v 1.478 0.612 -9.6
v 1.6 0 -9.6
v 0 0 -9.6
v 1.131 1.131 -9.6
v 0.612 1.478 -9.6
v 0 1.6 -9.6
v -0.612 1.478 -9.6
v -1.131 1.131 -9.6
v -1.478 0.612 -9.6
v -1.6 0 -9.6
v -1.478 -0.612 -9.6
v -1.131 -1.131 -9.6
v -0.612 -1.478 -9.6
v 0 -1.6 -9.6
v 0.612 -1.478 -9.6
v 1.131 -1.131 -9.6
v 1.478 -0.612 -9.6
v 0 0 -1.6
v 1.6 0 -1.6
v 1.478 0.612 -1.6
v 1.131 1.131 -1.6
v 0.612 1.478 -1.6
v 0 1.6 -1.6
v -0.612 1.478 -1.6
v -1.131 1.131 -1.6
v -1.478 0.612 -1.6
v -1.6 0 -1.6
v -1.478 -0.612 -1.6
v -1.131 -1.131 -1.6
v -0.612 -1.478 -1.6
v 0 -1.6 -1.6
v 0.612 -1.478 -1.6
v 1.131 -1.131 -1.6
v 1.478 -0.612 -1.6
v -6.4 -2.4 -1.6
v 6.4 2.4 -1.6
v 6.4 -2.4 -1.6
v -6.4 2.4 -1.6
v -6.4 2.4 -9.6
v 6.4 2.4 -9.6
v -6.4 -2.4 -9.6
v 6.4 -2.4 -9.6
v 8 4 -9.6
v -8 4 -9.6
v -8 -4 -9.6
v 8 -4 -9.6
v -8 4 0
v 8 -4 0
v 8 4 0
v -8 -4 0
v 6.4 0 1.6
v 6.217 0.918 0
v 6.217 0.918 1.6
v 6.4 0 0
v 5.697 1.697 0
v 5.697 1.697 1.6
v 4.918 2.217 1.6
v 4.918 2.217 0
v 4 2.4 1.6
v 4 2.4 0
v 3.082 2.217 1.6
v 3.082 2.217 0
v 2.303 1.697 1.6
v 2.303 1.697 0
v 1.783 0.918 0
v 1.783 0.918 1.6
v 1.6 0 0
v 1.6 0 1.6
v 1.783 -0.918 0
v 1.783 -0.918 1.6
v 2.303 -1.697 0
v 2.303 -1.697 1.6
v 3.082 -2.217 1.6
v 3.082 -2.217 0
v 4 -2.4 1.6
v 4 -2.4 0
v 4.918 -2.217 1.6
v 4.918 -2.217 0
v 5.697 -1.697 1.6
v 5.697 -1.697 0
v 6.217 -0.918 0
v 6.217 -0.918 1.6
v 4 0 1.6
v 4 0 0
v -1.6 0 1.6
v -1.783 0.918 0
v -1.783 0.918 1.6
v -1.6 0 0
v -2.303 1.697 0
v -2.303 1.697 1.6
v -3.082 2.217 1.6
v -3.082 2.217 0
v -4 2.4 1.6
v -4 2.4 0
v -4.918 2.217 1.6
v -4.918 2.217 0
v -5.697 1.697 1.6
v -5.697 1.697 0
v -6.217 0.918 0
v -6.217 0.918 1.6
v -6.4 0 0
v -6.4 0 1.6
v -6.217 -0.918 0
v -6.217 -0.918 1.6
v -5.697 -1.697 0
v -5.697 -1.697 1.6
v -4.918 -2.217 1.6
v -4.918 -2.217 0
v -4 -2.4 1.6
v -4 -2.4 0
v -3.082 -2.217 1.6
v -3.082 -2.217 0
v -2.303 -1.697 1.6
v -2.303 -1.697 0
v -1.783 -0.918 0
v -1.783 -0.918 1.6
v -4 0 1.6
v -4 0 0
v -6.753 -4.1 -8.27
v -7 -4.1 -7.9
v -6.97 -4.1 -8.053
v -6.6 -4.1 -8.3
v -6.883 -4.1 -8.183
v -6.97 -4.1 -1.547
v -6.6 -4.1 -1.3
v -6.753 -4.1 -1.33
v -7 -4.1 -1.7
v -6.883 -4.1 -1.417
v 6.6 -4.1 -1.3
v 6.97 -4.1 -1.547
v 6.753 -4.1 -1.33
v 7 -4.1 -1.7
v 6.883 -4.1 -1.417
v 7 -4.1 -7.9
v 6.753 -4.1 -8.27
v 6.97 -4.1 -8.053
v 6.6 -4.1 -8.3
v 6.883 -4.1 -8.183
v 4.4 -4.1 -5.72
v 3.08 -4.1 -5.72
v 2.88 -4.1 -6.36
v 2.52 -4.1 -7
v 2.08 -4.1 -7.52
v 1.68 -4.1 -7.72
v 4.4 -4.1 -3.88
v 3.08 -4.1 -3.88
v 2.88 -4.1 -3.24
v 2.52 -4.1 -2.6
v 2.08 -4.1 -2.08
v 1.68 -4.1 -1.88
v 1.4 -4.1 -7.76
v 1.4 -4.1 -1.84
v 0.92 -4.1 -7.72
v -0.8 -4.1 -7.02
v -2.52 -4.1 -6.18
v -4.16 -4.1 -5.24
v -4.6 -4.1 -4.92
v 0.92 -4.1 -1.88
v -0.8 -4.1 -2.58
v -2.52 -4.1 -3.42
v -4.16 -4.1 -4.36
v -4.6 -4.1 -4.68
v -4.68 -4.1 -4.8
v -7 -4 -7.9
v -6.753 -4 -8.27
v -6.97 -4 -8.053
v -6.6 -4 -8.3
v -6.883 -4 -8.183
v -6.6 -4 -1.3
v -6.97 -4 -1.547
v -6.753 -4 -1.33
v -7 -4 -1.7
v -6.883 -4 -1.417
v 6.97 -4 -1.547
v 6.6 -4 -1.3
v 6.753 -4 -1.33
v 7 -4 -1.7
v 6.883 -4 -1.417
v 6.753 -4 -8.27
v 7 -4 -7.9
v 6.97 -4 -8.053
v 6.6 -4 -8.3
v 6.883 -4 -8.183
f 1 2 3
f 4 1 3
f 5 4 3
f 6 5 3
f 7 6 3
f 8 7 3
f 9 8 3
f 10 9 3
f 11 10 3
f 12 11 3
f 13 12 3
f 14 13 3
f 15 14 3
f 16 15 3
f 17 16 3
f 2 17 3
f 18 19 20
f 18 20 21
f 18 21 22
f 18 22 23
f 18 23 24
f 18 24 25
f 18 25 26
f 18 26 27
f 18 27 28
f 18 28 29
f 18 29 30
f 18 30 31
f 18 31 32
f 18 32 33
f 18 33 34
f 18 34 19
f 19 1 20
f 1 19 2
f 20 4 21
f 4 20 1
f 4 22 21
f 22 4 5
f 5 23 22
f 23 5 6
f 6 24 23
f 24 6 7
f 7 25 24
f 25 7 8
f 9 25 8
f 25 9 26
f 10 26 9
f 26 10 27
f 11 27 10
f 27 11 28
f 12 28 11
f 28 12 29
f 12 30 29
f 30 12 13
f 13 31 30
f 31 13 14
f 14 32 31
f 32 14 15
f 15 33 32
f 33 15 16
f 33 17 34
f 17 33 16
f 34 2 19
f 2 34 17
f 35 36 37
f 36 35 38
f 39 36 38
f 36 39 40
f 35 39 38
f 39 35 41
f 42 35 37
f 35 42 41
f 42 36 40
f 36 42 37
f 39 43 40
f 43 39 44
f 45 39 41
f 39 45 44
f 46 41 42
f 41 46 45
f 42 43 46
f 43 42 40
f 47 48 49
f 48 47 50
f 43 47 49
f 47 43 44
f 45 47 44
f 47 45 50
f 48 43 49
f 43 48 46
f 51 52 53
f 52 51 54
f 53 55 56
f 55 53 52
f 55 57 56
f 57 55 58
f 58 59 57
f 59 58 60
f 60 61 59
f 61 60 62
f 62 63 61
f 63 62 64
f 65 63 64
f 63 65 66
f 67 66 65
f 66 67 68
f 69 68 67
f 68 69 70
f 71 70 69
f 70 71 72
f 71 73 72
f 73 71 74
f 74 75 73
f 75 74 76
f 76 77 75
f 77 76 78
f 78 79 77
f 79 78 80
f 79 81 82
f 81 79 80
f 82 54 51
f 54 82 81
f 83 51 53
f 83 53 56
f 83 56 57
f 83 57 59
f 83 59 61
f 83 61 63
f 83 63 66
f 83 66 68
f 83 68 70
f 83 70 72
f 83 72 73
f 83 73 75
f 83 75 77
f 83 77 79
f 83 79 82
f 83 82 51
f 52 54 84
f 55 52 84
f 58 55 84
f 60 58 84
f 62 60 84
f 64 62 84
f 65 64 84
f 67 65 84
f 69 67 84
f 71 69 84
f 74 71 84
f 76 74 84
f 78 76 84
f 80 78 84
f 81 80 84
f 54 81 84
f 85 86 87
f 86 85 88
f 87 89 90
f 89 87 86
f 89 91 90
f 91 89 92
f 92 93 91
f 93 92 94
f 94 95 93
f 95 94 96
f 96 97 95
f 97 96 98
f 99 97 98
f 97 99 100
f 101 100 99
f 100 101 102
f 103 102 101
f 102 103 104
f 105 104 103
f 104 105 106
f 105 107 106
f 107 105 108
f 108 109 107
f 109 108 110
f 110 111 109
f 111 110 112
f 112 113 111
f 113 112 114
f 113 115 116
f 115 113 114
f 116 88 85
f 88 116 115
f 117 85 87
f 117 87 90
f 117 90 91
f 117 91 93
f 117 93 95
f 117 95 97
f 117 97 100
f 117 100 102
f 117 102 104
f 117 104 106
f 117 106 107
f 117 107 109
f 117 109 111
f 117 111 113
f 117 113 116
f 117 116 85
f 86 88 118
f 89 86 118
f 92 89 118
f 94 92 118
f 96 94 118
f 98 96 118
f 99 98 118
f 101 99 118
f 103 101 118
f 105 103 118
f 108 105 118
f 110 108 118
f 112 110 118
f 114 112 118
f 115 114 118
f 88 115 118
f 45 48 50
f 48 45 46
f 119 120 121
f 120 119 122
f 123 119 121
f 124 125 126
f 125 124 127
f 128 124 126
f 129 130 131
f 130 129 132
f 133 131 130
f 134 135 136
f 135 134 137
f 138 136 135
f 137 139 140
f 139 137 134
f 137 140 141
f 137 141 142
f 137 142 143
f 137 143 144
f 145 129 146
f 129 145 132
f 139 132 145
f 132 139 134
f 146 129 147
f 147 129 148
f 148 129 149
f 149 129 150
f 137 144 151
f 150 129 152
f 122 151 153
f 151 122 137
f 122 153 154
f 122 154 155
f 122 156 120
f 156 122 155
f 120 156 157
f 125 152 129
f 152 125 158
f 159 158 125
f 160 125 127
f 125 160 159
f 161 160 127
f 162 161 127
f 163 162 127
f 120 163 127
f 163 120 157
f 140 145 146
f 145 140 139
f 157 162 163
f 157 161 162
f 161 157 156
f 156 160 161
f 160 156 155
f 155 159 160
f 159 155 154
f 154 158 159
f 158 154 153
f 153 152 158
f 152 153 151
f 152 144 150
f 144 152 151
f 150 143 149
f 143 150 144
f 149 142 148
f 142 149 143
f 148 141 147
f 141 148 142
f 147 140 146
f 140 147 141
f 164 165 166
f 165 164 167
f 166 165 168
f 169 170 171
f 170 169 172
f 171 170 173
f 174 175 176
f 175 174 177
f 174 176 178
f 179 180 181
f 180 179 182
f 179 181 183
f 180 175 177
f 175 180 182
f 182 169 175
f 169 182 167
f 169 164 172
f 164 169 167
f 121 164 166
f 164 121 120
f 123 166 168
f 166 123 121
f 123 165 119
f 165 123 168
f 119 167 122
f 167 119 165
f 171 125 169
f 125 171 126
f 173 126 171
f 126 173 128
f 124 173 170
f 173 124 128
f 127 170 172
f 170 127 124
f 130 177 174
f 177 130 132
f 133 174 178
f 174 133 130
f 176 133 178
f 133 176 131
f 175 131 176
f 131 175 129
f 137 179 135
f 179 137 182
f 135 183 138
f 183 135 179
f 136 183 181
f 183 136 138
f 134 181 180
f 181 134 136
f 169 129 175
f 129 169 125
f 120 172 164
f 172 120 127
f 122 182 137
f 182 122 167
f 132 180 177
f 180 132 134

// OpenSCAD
// file: ../p/4-4edge.scad
use <../lib.scad>
function ldraw_lib__4_4edge() = [
// 0 Circle 1.0
// 0 Name: 4-4edge.dat
// 0 Author: James Jessiman
// 0 !LDRAW_ORG Primitive UPDATE 2017-01
// 0 !LICENSE Licensed under CC BY 2.0 and CC BY 4.0 : see CAreadme.txt
// 
// 0 BFC CERTIFY CCW
  [0,"BFC","CERTIFY"],
  [0,"BFC","CCW"],
// 
// 0 !HISTORY 1998-12-15 [PTadmin] Official Update 1998-10
// 0 !HISTORY 2005-12-28 [PTadmin] Official Update 2005-01
// 0 !HISTORY 2007-06-24 [PTadmin] Header formatted for Contributor Agreement
// 0 !HISTORY 2008-07-01 [PTadmin] Official Update 2008-01
// 0 !HISTORY 2017-01-15 [Steffen] BFCed
// 0 !HISTORY 2017-12-30 [PTadmin] Official Update 2017-01
// 
// 
// 2 24 1 0 0 0.9239 0 0.3827
  [2,24,1,0,0,0.9239,0,0.3827],
// 2 24 0.9239 0 0.3827 0.7071 0 0.7071
  [2,24,0.9239,0,0.3827,0.7071,0,0.7071],
// 2 24 0.7071 0 0.7071 0.3827 0 0.9239
  [2,24,0.7071,0,0.7071,0.3827,0,0.9239],
// 2 24 0.3827 0 0.9239 0 0 1
  [2,24,0.3827,0,0.9239,0,0,1],
// 2 24 0 0 1 -0.3827 0 0.9239
  [2,24,0,0,1,-0.3827,0,0.9239],
// 2 24 -0.3827 0 0.9239 -0.7071 0 0.7071
  [2,24,-0.3827,0,0.9239,-0.7071,0,0.7071],
// 2 24 -0.7071 0 0.7071 -0.9239 0 0.3827
  [2,24,-0.7071,0,0.7071,-0.9239,0,0.3827],
// 2 24 -0.9239 0 0.3827 -1 0 -0
  [2,24,-0.9239,0,0.3827,-1,0,-0],
// 2 24 -1 0 -0 -0.9239 0 -0.3827
  [2,24,-1,0,-0,-0.9239,0,-0.3827],
// 2 24 -0.9239 0 -0.3827 -0.7071 0 -0.7071
  [2,24,-0.9239,0,-0.3827,-0.7071,0,-0.7071],
// 2 24 -0.7071 0 -0.7071 -0.3827 0 -0.9239
  [2,24,-0.7071,0,-0.7071,-0.3827,0,-0.9239],
// 2 24 -0.3827 0 -0.9239 0 0 -1
  [2,24,-0.3827,0,-0.9239,0,0,-1],
// 2 24 0 0 -1 0.3827 0 -0.9239
  [2,24,0,0,-1,0.3827,0,-0.9239],
// 2 24 0.3827 0 -0.9239 0.7071 0 -0.7071
  [2,24,0.3827,0,-0.9239,0.7071,0,-0.7071],
// 2 24 0.7071 0 -0.7071 0.9239 0 -0.3827
  [2,24,0.7071,0,-0.7071,0.9239,0,-0.3827],
// 2 24 0.9239 0 -0.3827 1 0 0
  [2,24,0.9239,0,-0.3827,1,0,0],
];
module ldraw_lib__4_4edge(step=0, col=false, unit=2/5, alt=false, line=0.2, solid=!$preview)
    makepoly(ldraw_lib__4_4edge(), step=step, col=col, unit=unit, alt=alt, line=line, solid=solid);
ldraw_lib__4_4edge(line=0.2);
// file: ../p/4-4disc.scad
use <../lib.scad>
function ldraw_lib__4_4disc() = [
// 0 Disc 1.0
// 0 Name: 4-4disc.dat
// 0 Author: James Jessiman
// 0 !LDRAW_ORG Primitive UPDATE 2002-02
// 0 !LICENSE Licensed under CC BY 2.0 and CC BY 4.0 : see CAreadme.txt
// 
// 0 BFC CERTIFY CCW
  [0,"BFC","CERTIFY"],
  [0,"BFC","CCW"],
// 
// 0 !HISTORY 1998-12-15 [PTadmin] Official Update 1998-10
// 0 !HISTORY 2002-03-23 [sbliss] Added BFC statement
// 0 !HISTORY 2002-04-25 [PTadmin] Official Update 2002-02
// 0 !HISTORY 2007-06-24 [PTadmin] Header formatted for Contributor Agreement
// 0 !HISTORY 2008-07-01 [PTadmin] Official Update 2008-01
// 
// 
// 3 16 0 0 0 1 0 0 0.9239 0 0.3827
  [3,16,0,0,0,1,0,0,0.9239,0,0.3827],
// 3 16 0 0 0 0.9239 0 0.3827 0.7071 0 0.7071
  [3,16,0,0,0,0.9239,0,0.3827,0.7071,0,0.7071],
// 3 16 0 0 0 0.7071 0 0.7071 0.3827 0 0.9239
  [3,16,0,0,0,0.7071,0,0.7071,0.3827,0,0.9239],
// 3 16 0 0 0 0.3827 0 0.9239 0 0 1
  [3,16,0,0,0,0.3827,0,0.9239,0,0,1],
// 3 16 0 0 0 0 0 1 -0.3827 0 0.9239
  [3,16,0,0,0,0,0,1,-0.3827,0,0.9239],
// 3 16 0 0 0 -0.3827 0 0.9239 -0.7071 0 0.7071
  [3,16,0,0,0,-0.3827,0,0.9239,-0.7071,0,0.7071],
// 3 16 0 0 0 -0.7071 0 0.7071 -0.9239 0 0.3827
  [3,16,0,0,0,-0.7071,0,0.7071,-0.9239,0,0.3827],
// 3 16 0 0 0 -0.9239 0 0.3827 -1 0 -0
  [3,16,0,0,0,-0.9239,0,0.3827,-1,0,-0],
// 3 16 0 0 0 -1 0 -0 -0.9239 0 -0.3827
  [3,16,0,0,0,-1,0,-0,-0.9239,0,-0.3827],
// 3 16 0 0 0 -0.9239 0 -0.3827 -0.7071 0 -0.7071
  [3,16,0,0,0,-0.9239,0,-0.3827,-0.7071,0,-0.7071],
// 3 16 0 0 0 -0.7071 0 -0.7071 -0.3827 0 -0.9239
  [3,16,0,0,0,-0.7071,0,-0.7071,-0.3827,0,-0.9239],
// 3 16 0 0 0 -0.3827 0 -0.9239 0 0 -1
  [3,16,0,0,0,-0.3827,0,-0.9239,0,0,-1],
// 3 16 0 0 0 0 0 -1 0.3827 0 -0.9239
  [3,16,0,0,0,0,0,-1,0.3827,0,-0.9239],
// 3 16 0 0 0 0.3827 0 -0.9239 0.7071 0 -0.7071
  [3,16,0,0,0,0.3827,0,-0.9239,0.7071,0,-0.7071],
// 3 16 0 0 0 0.7071 0 -0.7071 0.9239 0 -0.3827
  [3,16,0,0,0,0.7071,0,-0.7071,0.9239,0,-0.3827],
// 3 16 0 0 0 0.9239 0 -0.3827 1 0 0
  [3,16,0,0,0,0.9239,0,-0.3827,1,0,0],
// 0
];
module ldraw_lib__4_4disc(step=0, col=false, unit=2/5, alt=false, line=0.2, solid=!$preview)
    makepoly(ldraw_lib__4_4disc(), step=step, col=col, unit=unit, alt=alt, line=line, solid=solid);
ldraw_lib__4_4disc(line=0.2);
// file: ../p/4-4cyli.scad
use <../lib.scad>
$fa=1; $fs=0.2;
function ldraw_lib__4_4cyli(realsolid=false) = [
// 0 Cylinder 1.0
// 0 Name: 4-4cyli.dat
// 0 Author: James Jessiman
// 0 !LDRAW_ORG Primitive UPDATE 2005-01
// 0 !LICENSE Licensed under CC BY 2.0 and CC BY 4.0 : see CAreadme.txt
// 
// 0 BFC CERTIFY CCW
  [0,"BFC","CERTIFY"],
  [0,"BFC","CCW"],
// 
// 0 !HISTORY 1998-12-15 [PTadmin] Official Update 1998-10
// 0 !HISTORY 2002-03-23 [sbliss] Added BFC statement; merged headers from files in distributions LDraw 0.27 and Complete.
// 0 !HISTORY 2002-04-25 [PTadmin] Official Update 2002-02
// 0 !HISTORY 2004-12-14 [guyvivan] BFC CCW
// 0 !HISTORY 2005-12-28 [PTadmin] Official Update 2005-01
// 0 !HISTORY 2007-06-24 [PTadmin] Header formatted for Contributor Agreement
// 0 !HISTORY 2008-07-01 [PTadmin] Official Update 2008-01
// 
// 
// 4 16 1 1 0 0.9239 1 0.3827 0.9239 0 0.3827 1 0 0
  [4,16,1,1,0,0.9239,1,0.3827,0.9239,0,0.3827,1,0,0],
// 5 24 1 0 0 1 1 0 0.9239 0 0.3827 0.9239 0 -0.3827
  [5,24,1,0,0,1,1,0,0.9239,0,0.3827,0.9239,0,-0.3827],
// 4 16 0.9239 1 0.3827 0.7071 1 0.7071 0.7071 0 0.7071 0.9239 0 0.3827
  [4,16,0.9239,1,0.3827,0.7071,1,0.7071,0.7071,0,0.7071,0.9239,0,0.3827],
// 5 24 0.9239 0 0.3827 0.9239 1 0.3827 0.7071 0 0.7071 1 0 0
  [5,24,0.9239,0,0.3827,0.9239,1,0.3827,0.7071,0,0.7071,1,0,0],
// 4 16 0.7071 1 0.7071 0.3827 1 0.9239 0.3827 0 0.9239 0.7071 0 0.7071
  [4,16,0.7071,1,0.7071,0.3827,1,0.9239,0.3827,0,0.9239,0.7071,0,0.7071],
// 5 24 0.7071 0 0.7071 0.7071 1 0.7071 0.3827 0 0.9239 0.9239 0 0.3827
  [5,24,0.7071,0,0.7071,0.7071,1,0.7071,0.3827,0,0.9239,0.9239,0,0.3827],
// 4 16 0.3827 1 0.9239 0 1 1 0 0 1 0.3827 0 0.9239
  [4,16,0.3827,1,0.9239,0,1,1,0,0,1,0.3827,0,0.9239],
// 5 24 0.3827 0 0.9239 0.3827 1 0.9239 0 0 1 0.7071 0 0.7071
  [5,24,0.3827,0,0.9239,0.3827,1,0.9239,0,0,1,0.7071,0,0.7071],
// 4 16 0 1 1 -0.3827 1 0.9239 -0.3827 0 0.9239 0 0 1
  [4,16,0,1,1,-0.3827,1,0.9239,-0.3827,0,0.9239,0,0,1],
// 5 24 0 0 1 0 1 1 -0.3827 0 0.9239 0.3827 0 0.9239
  [5,24,0,0,1,0,1,1,-0.3827,0,0.9239,0.3827,0,0.9239],
// 4 16 -0.3827 1 0.9239 -0.7071 1 0.7071 -0.7071 0 0.7071 -0.3827 0 0.9239
  [4,16,-0.3827,1,0.9239,-0.7071,1,0.7071,-0.7071,0,0.7071,-0.3827,0,0.9239],
// 5 24 -0.3827 0 0.9239 -0.3827 1 0.9239 -0.7071 0 0.7071 0 0 1
  [5,24,-0.3827,0,0.9239,-0.3827,1,0.9239,-0.7071,0,0.7071,0,0,1],
// 4 16 -0.7071 1 0.7071 -0.9239 1 0.3827 -0.9239 0 0.3827 -0.7071 0 0.7071
  [4,16,-0.7071,1,0.7071,-0.9239,1,0.3827,-0.9239,0,0.3827,-0.7071,0,0.7071],
// 5 24 -0.7071 0 0.7071 -0.7071 1 0.7071 -0.9239 0 0.3827 -0.3827 0 0.9239
  [5,24,-0.7071,0,0.7071,-0.7071,1,0.7071,-0.9239,0,0.3827,-0.3827,0,0.9239],
// 4 16 -0.9239 1 0.3827 -1 1 0 -1 0 0 -0.9239 0 0.3827
  [4,16,-0.9239,1,0.3827,-1,1,0,-1,0,0,-0.9239,0,0.3827],
// 5 24 -0.9239 0 0.3827 -0.9239 1 0.3827 -1 0 0 -0.7071 0 0.7071
  [5,24,-0.9239,0,0.3827,-0.9239,1,0.3827,-1,0,0,-0.7071,0,0.7071],
// 4 16 -1 1 0 -0.9239 1 -0.3827 -0.9239 0 -0.3827 -1 0 0
  [4,16,-1,1,0,-0.9239,1,-0.3827,-0.9239,0,-0.3827,-1,0,0],
// 5 24 -1 0 0 -1 1 0 -0.9239 0 -0.3827 -0.9239 0 0.3827
  [5,24,-1,0,0,-1,1,0,-0.9239,0,-0.3827,-0.9239,0,0.3827],
// 4 16 -0.9239 1 -0.3827 -0.7071 1 -0.7071 -0.7071 0 -0.7071 -0.9239 0 -0.3827
  [4,16,-0.9239,1,-0.3827,-0.7071,1,-0.7071,-0.7071,0,-0.7071,-0.9239,0,-0.3827],
// 5 24 -0.9239 0 -0.3827 -0.9239 1 -0.3827 -0.7071 0 -0.7071 -1 0 0
  [5,24,-0.9239,0,-0.3827,-0.9239,1,-0.3827,-0.7071,0,-0.7071,-1,0,0],
// 4 16 -0.7071 1 -0.7071 -0.3827 1 -0.9239 -0.3827 0 -0.9239 -0.7071 0 -0.7071
  [4,16,-0.7071,1,-0.7071,-0.3827,1,-0.9239,-0.3827,0,-0.9239,-0.7071,0,-0.7071],
// 5 24 -0.7071 0 -0.7071 -0.7071 1 -0.7071 -0.3827 0 -0.9239 -0.9239 0 -0.3827
  [5,24,-0.7071,0,-0.7071,-0.7071,1,-0.7071,-0.3827,0,-0.9239,-0.9239,0,-0.3827],
// 4 16 -0.3827 1 -0.9239 0 1 -1 0 0 -1 -0.3827 0 -0.9239
  [4,16,-0.3827,1,-0.9239,0,1,-1,0,0,-1,-0.3827,0,-0.9239],
// 5 24 -0.3827 0 -0.9239 -0.3827 1 -0.9239 0 0 -1 -0.7071 0 -0.7071
  [5,24,-0.3827,0,-0.9239,-0.3827,1,-0.9239,0,0,-1,-0.7071,0,-0.7071],
// 4 16 0 1 -1 0.3827 1 -0.9239 0.3827 0 -0.9239 0 0 -1
  [4,16,0,1,-1,0.3827,1,-0.9239,0.3827,0,-0.9239,0,0,-1],
// 5 24 0 0 -1 0 1 -1 0.3827 0 -0.9239 -0.3827 0 -0.9239
  [5,24,0,0,-1,0,1,-1,0.3827,0,-0.9239,-0.3827,0,-0.9239],
// 4 16 0.3827 1 -0.9239 0.7071 1 -0.7071 0.7071 0 -0.7071 0.3827 0 -0.9239
  [4,16,0.3827,1,-0.9239,0.7071,1,-0.7071,0.7071,0,-0.7071,0.3827,0,-0.9239],
// 5 24 0.3827 0 -0.9239 0.3827 1 -0.9239 0.7071 0 -0.7071 0 0 -1
  [5,24,0.3827,0,-0.9239,0.3827,1,-0.9239,0.7071,0,-0.7071,0,0,-1],
// 4 16 0.7071 1 -0.7071 0.9239 1 -0.3827 0.9239 0 -0.3827 0.7071 0 -0.7071
  [4,16,0.7071,1,-0.7071,0.9239,1,-0.3827,0.9239,0,-0.3827,0.7071,0,-0.7071],
// 5 24 0.7071 0 -0.7071 0.7071 1 -0.7071 0.9239 0 -0.3827 0.3827 0 -0.9239
  [5,24,0.7071,0,-0.7071,0.7071,1,-0.7071,0.9239,0,-0.3827,0.3827,0,-0.9239],
// 4 16 0.9239 1 -0.3827 1 1 0 1 0 0 0.9239 0 -0.3827
  [4,16,0.9239,1,-0.3827,1,1,0,1,0,0,0.9239,0,-0.3827],
// 5 24 0.9239 0 -0.3827 0.9239 1 -0.3827 1 0 0 0.7071 0 -0.7071
  [5,24,0.9239,0,-0.3827,0.9239,1,-0.3827,1,0,0,0.7071,0,-0.7071],
// 0
];
module ldraw_lib__4_4cyli(step=0, col=false, unit=2/5, alt=false, line=0.2, solid=!$preview)
    makepoly(ldraw_lib__4_4cyli(solid), step=step, col=col, unit=unit, alt=alt, line=line, solid=solid);
ldraw_lib__4_4cyli(line=0.2);
// file: ../p/stud3.scad
use <../lib.scad>
use <4-4cyli.scad>
use <4-4disc.scad>
use <4-4edge.scad>
function ldraw_lib__stud3() = [
// 0 Stud Tube Solid
// 0 Name: stud3.dat
// 0 Author: James Jessiman
// 0 !LDRAW_ORG Primitive UPDATE 2012-01
// 0 !LICENSE Licensed under CC BY 4.0 : see CAreadme.txt
// 
// 0 BFC CERTIFY CCW
  [0,"BFC","CERTIFY"],
  [0,"BFC","CCW"],
// 
// 0 !HISTORY 2002-04-04 [sbliss] Modified for BFC compliance
// 0 !HISTORY 2002-04-25 [PTadmin] Official Update 2002-02
// 0 !HISTORY 2007-06-24 [PTadmin] Header formatted for Contributor Agreement
// 0 !HISTORY 2008-07-01 [PTadmin] Official Update 2008-01
// 0 !HISTORY 2012-02-16 [Philo] Changed to CCW
// 0 !HISTORY 2012-03-30 [PTadmin] Official Update 2012-01
// 
// 
// 1 16 0 -4 0 4 0 0 0 1 0 0 0 4 4-4edge.dat
  [1,16,0,-4,0,4,0,0,0,1,0,0,0,4, ldraw_lib__4_4edge()],
// 1 16 0 0 0 4 0 0 0 1 0 0 0 4 4-4edge.dat
  [1,16,0,0,0,4,0,0,0,1,0,0,0,4, ldraw_lib__4_4edge()],
// 1 16 0 -4 0 4 0 0 0 1 0 0 0 4 4-4disc.dat
  [1,16,0,-4,0,4,0,0,0,1,0,0,0,4, ldraw_lib__4_4disc()],
  [-1,16,0,0,0,4,0,0,0,-1,0,0,0,4, ldraw_lib__4_4disc()],
// 1 16 0 -4 0 4 0 0 0 4 0 0 0 4 4-4cyli.dat
  [1,16,0,-4,0,4,0,0,0,4,0,0,0,4, ldraw_lib__4_4cyli()],
];
module ldraw_lib__stud3(step=0, col=false, unit=2/5, alt=false, line=0.2, solid=!$preview)
    makepoly(ldraw_lib__stud3(), step=step, col=col, unit=unit, alt=alt, line=line, solid=solid);
ldraw_lib__stud3(line=0.2);
// file: ../p/stud.scad
use <../lib.scad>
use <4-4cyli.scad>
use <4-4disc.scad>
use <4-4edge.scad>
function ldraw_lib__stud() = [
// 0 Stud
// 0 Name: stud.dat
// 0 Author: James Jessiman
// 0 !LDRAW_ORG Primitive UPDATE 2012-01
// 0 !LICENSE Licensed under CC BY 4.0 : see CAreadme.txt
// 
// 0 BFC CERTIFY CCW
  [0,"BFC","CERTIFY"],
  [0,"BFC","CCW"],
// 
// 0 !HISTORY 2002-04-04 [sbliss] Modified for BFC compliance
// 0 !HISTORY 2002-04-25 [PTadmin] Official Update 2002-02
// 0 !HISTORY 2007-06-24 [PTadmin] Header formatted for Contributor Agreement
// 0 !HISTORY 2008-07-01 [PTadmin] Official Update 2008-01
// 0 !HISTORY 2012-02-16 [Philo] Changed to CCW
// 0 !HISTORY 2012-03-30 [PTadmin] Official Update 2012-01
// 
// 
// 1 16 0 0 0 6 0 0 0 1 0 0 0 6 4-4edge.dat
  [1,16,0,0,0,6,0,0,0,1,0,0,0,6, ldraw_lib__4_4edge()],
// 1 16 0 -4 0 6 0 0 0 1 0 0 0 6 4-4edge.dat
  [1,16,0,-4,0,6,0,0,0,1,0,0,0,6, ldraw_lib__4_4edge()],
// 1 16 0 0 0 6 0 0 0 -4 0 0 0 6 4-4cyli.dat
  [1,16,0,0,0,6,0,0,0,-4,0,0,0,6, ldraw_lib__4_4cyli()],
// 1 16 0 -4 0 6 0 0 0 1 0 0 0 6 4-4disc.dat
  [1,16,0,-4,0,6,0,0,0,1,0,0,0,6, ldraw_lib__4_4disc()],
  [-1,16,0,0,0,6,0,0,0,-1,0,0,0,6, ldraw_lib__4_4disc()],
];
module ldraw_lib__stud(step=0, col=false, unit=2/5, alt=false, line=0.2, solid=!$preview)
    makepoly(ldraw_lib__stud(), step=step, col=col, unit=unit, alt=alt, line=line, solid=solid);
ldraw_lib__stud(line=0.2);
// file: ../p/box5.scad
use <../lib.scad>
function ldraw_lib__box5() = [
// 0 Box with 5 Faces and All Edges
// 0 Name: box5.dat
// 0 Author: James Jessiman
// 0 !LDRAW_ORG Primitive UPDATE 2012-01
// 0 !LICENSE Licensed under CC BY 2.0 and CC BY 4.0 : see CAreadme.txt
// 
// 0 BFC CERTIFY CCW
  [0,"BFC","CERTIFY"],
  [0,"BFC","CCW"],
// 
// 0 !HISTORY 2002-04-03 [sbliss] Modified for BFC compliance
// 0 !HISTORY 2002-04-25 [PTadmin] Official Update 2002-02
// 0 !HISTORY 2007-06-24 [PTadmin] Header formatted for Contributor Agreement
// 0 !HISTORY 2008-07-01 [PTadmin] Official Update 2008-01
// 0 !HISTORY 2012-02-16 [Philo] Changed to CCW
// 0 !HISTORY 2012-03-30 [PTadmin] Official Update 2012-01
// 
// 
// 2 24 1 1 1 -1 1 1
  [2,24,1,1,1,-1,1,1],
// 2 24 -1 1 1 -1 1 -1
  [2,24,-1,1,1,-1,1,-1],
// 2 24 -1 1 -1 1 1 -1
  [2,24,-1,1,-1,1,1,-1],
// 2 24 1 1 -1 1 1 1
  [2,24,1,1,-1,1,1,1],
// 2 24 1 0 1 -1 0 1
  [2,24,1,0,1,-1,0,1],
// 2 24 -1 0 1 -1 0 -1
  [2,24,-1,0,1,-1,0,-1],
// 2 24 -1 0 -1 1 0 -1
  [2,24,-1,0,-1,1,0,-1],
// 2 24 1 0 -1 1 0 1
  [2,24,1,0,-1,1,0,1],
// 2 24 1 0 1 1 1 1
  [2,24,1,0,1,1,1,1],
// 2 24 -1 0 1 -1 1 1
  [2,24,-1,0,1,-1,1,1],
// 2 24 1 0 -1 1 1 -1
  [2,24,1,0,-1,1,1,-1],
// 2 24 -1 0 -1 -1 1 -1
  [2,24,-1,0,-1,-1,1,-1],
// 4 16 -1 1 1 1 1 1 1 1 -1 -1 1 -1
  [4,16,-1,1,1,1,1,1,1,1,-1,-1,1,-1],
// 4 16 -1 1 1 -1 0 1 1 0 1 1 1 1
  [4,16,-1,1,1,-1,0,1,1,0,1,1,1,1],
// 4 16 -1 1 -1 -1 0 -1 -1 0 1 -1 1 1
  [4,16,-1,1,-1,-1,0,-1,-1,0,1,-1,1,1],
// 4 16 1 1 -1 1 0 -1 -1 0 -1 -1 1 -1
  [4,16,1,1,-1,1,0,-1,-1,0,-1,-1,1,-1],
// 4 16 1 1 1 1 0 1 1 0 -1 1 1 -1
  [4,16,1,1,1,1,0,1,1,0,-1,1,1,-1],
];
makepoly(ldraw_lib__box5(), line=0.2);
// file: ../p/box4t.scad
use <../lib.scad>
function ldraw_lib__box4t() = [
// 0 Box with 4 Adjacent Faces and All Edges
// 0 Name: box4t.dat
// 0 Author: Tore Eriksson [Tore_Eriksson]
// 0 !LDRAW_ORG Primitive UPDATE 2003-02
// 0 !LICENSE Licensed under CC BY 2.0 and CC BY 4.0 : see CAreadme.txt
// 
// 0 BFC CERTIFY CCW
  [0,"BFC","CERTIFY"],
  [0,"BFC","CCW"],
// 
// 0 !HISTORY 1997-09-29 [PTadmin] Official Update 1997-15
// 0 !HISTORY 2002-08-31 [izanette] Modified with WINDZ for BFC compliance
// 0 !HISTORY 2003-08-01 [PTadmin] Official Update 2003-02
// 0 !HISTORY 2007-06-24 [PTadmin] Header formatted for Contributor Agreement
// 0 !HISTORY 2008-07-01 [PTadmin] Official Update 2008-01
// 
// 
// 2 24 1 1 1 -1 1 1
  [2,24,1,1,1,-1,1,1],
// 2 24 -1 1 1 -1 1 -1
  [2,24,-1,1,1,-1,1,-1],
// 2 24 -1 1 -1 1 1 -1
  [2,24,-1,1,-1,1,1,-1],
// 2 24 1 1 -1 1 1 1
  [2,24,1,1,-1,1,1,1],
// 2 24 1 0 1 -1 0 1
  [2,24,1,0,1,-1,0,1],
// 2 24 -1 0 1 -1 0 -1
  [2,24,-1,0,1,-1,0,-1],
// 2 24 -1 0 -1 1 0 -1
  [2,24,-1,0,-1,1,0,-1],
// 2 24 1 0 -1 1 0 1
  [2,24,1,0,-1,1,0,1],
// 2 24 1 0 1 1 1 1
  [2,24,1,0,1,1,1,1],
// 2 24 -1 0 1 -1 1 1
  [2,24,-1,0,1,-1,1,1],
// 2 24 1 0 -1 1 1 -1
  [2,24,1,0,-1,1,1,-1],
// 2 24 -1 0 -1 -1 1 -1
  [2,24,-1,0,-1,-1,1,-1],
// 4 16 1 1 1 1 1 -1 -1 1 -1 -1 1 1
  [4,16,1,1,1,1,1,-1,-1,1,-1,-1,1,1],
// 4 16 1 1 1 -1 1 1 -1 0 1 1 0 1
  [4,16,1,1,1,-1,1,1,-1,0,1,1,0,1],
// 4 16 -1 1 1 -1 1 -1 -1 0 -1 -1 0 1
  [4,16,-1,1,1,-1,1,-1,-1,0,-1,-1,0,1],
// 0 4 16 -1 1 -1 -1 0 -1 1 0 -1 1 1 -1
// 4 16 1 1 -1 1 1 1 1 0 1 1 0 -1
  [4,16,1,1,-1,1,1,1,1,0,1,1,0,-1],
// 0
];
makepoly(ldraw_lib__box4t(), line=0.2);
// file: ../p/1-4cyli.scad
use <../lib.scad>
function ldraw_lib__1_4cyli() = [
// 0 Cylinder 0.25
// 0 Name: 1-4cyli.dat
// 0 Author: James Jessiman
// 0 !LDRAW_ORG Primitive UPDATE 2012-01
// 0 !LICENSE Licensed under CC BY 2.0 and CC BY 4.0 : see CAreadme.txt
// 
// 0 BFC CERTIFY CCW
  [0,"BFC","CERTIFY"],
  [0,"BFC","CCW"],
// 
// 0 !HISTORY 2002-03-23 [sbliss] Added BFC statement.
// 0 !HISTORY 2002-04-25 [PTadmin] Official Update 2002-02
// 0 !HISTORY 2007-06-22 [PTadmin] Header formatted for Contributor Agreement
// 0 !HISTORY 2008-07-01 [PTadmin] Official Update 2008-01
// 0 !HISTORY 2012-02-16 [Philo] Changed to CCW
// 0 !HISTORY 2012-03-30 [PTadmin] Official Update 2012-01
// 
// 
// 4 16 1 1 0 0.9239 1 0.3827 0.9239 0 0.3827 1 0 0
  [4,16,1,1,0,0.9239,1,0.3827,0.9239,0,0.3827,1,0,0],
// 5 24 1 0 0 1 1 0 0.9239 0 0.3827 1 0 -1
  [5,24,1,0,0,1,1,0,0.9239,0,0.3827,1,0,-1],
// 4 16 0.9239 1 0.3827 0.7071 1 0.7071 0.7071 0 0.7071 0.9239 0 0.3827
  [4,16,0.9239,1,0.3827,0.7071,1,0.7071,0.7071,0,0.7071,0.9239,0,0.3827],
// 5 24 0.9239 0 0.3827 0.9239 1 0.3827 0.7071 0 0.7071 1 0 0
  [5,24,0.9239,0,0.3827,0.9239,1,0.3827,0.7071,0,0.7071,1,0,0],
// 4 16 0.7071 1 0.7071 0.3827 1 0.9239 0.3827 0 0.9239 0.7071 0 0.7071
  [4,16,0.7071,1,0.7071,0.3827,1,0.9239,0.3827,0,0.9239,0.7071,0,0.7071],
// 5 24 0.7071 0 0.7071 0.7071 1 0.7071 0.3827 0 0.9239 0.9239 0 0.3827
  [5,24,0.7071,0,0.7071,0.7071,1,0.7071,0.3827,0,0.9239,0.9239,0,0.3827],
// 4 16 0.3827 1 0.9239 0 1 1 0 0 1 0.3827 0 0.9239
  [4,16,0.3827,1,0.9239,0,1,1,0,0,1,0.3827,0,0.9239],
// 5 24 0.3827 0 0.9239 0.3827 1 0.9239 0 0 1 0.7071 0 0.7071
  [5,24,0.3827,0,0.9239,0.3827,1,0.9239,0,0,1,0.7071,0,0.7071],
// 5 24 0 0 1 0 1 1 0.3827 0 0.9239 -1 0 1
  [5,24,0,0,1,0,1,1,0.3827,0,0.9239,-1,0,1],
];
module ldraw_lib__1_4cyli(step=0, col=false, unit=2/5, alt=false, line=0.2, solid=!$preview)
    makepoly(ldraw_lib__1_4cyli(), step=step, col=col, unit=unit, alt=alt, line=line, solid=solid);
ldraw_lib__1_4cyli(line=0.2);
// file: ../p/1-4chrd.scad
use <../lib.scad>
$fa=1; $fs=0.2;
function ldraw_lib__1_4chrd(realsolid=false) = [
// 0 Chord 0.25
// 0 Name: 1-4chrd.dat
// 0 Author: Tony Hafner [hafhead]
// 0 !LDRAW_ORG Primitive UPDATE 2012-02
// 0 !LICENSE Licensed under CC BY 2.0 and CC BY 4.0 : see CAreadme.txt
// 
// 0 BFC CERTIFY CCW
  [0,"BFC","CERTIFY"],
  [0,"BFC","CCW"],
// 
// 0 !HISTORY 2004-04-22 [PTadmin] Official Update 2004-02
// 0 !HISTORY 2007-10-09 [PTadmin] Header formatted for Contributor Agreement
// 0 !HISTORY 2008-07-01 [PTadmin] Official Update 2008-01
// 0 !HISTORY 2012-08-02 [MMR1988] Re-creation with PrimGen2 and Rectifier
// 0 !HISTORY 2012-08-09 [PTadmin] Official Update 2012-02
// 
// 
// 4 16 0.9239 0 0.3827 0.3827 0 0.9239 0 0 1 1 0 0
  [4,16,0.9239,0,0.3827,0.3827,0,0.9239,0,0,1,1,0,0],
// 3 16 0.7071 0 0.7071 0.3827 0 0.9239 0.9239 0 0.3827
  [3,16,0.7071,0,0.7071,0.3827,0,0.9239,0.9239,0,0.3827],
];
module ldraw_lib__1_4chrd(step=0, col=false, unit=2/5, alt=false, line=0.2, solid=!$preview)
    makepoly(ldraw_lib__1_4chrd(solid), step=step, col=col, unit=unit, alt=alt, line=line, solid=solid);
ldraw_lib__1_4chrd(line=0.2);
// file: s/3004s01.scad
use <../../lib.scad>
use <../../p/box4t.scad>
use <../../p/box5.scad>
use <../../p/stud.scad>
use <../../p/stud3.scad>
$fa=1; $fs=0.2;
function ldraw_lib__s__3004s01(realsolid=false) = [
// 0 ~Brick  1 x  2 without Front Face
// 0 Name: s\3004s01.dat
// 0 Author: James Jessiman
// 0 !LDRAW_ORG Subpart UPDATE 2003-03
// 0 !LICENSE Licensed under CC BY 2.0 and CC BY 4.0 : see CAreadme.txt
// 
// 0 BFC CERTIFY CCW
  [0,"BFC","CERTIFY"],
  [0,"BFC","CCW"],
// 
// 0 !HISTORY 2003-09-07 [jriley] Subfiling, BFC
// 0 !HISTORY 2003-12-19 [PTadmin] Official Update 2003-03
// 0 !HISTORY 2007-08-29 [PTadmin] Header formatted for Contributor Agreement
// 0 !HISTORY 2008-07-01 [PTadmin] Official Update 2008-01
// 
// 
// 1 16 0 4 0 1 0 0 0 -5 0 0 0 1 stud3.dat
  [1,16,0,4,0,1,0,0,0,-5,0,0,0,1, ldraw_lib__stud3(realsolid)],
// 0 BFC INVERTNEXT
  [0,"BFC","INVERTNEXT"],
// 1 16 0 24 0 16 0 0 0 -20 0 0 0 6 box5.dat
  [1,16,0,24,0,16,0,0,0,-20,0,0,0,6, ldraw_lib__box5(realsolid)],
// 4 16 20 24 10 16 24 6 -16 24 6 -20 24 10
  [4,16,20,24,10,16,24,6,-16,24,6,-20,24,10],
// 4 16 -20 24 10 -16 24 6 -16 24 -6 -20 24 -10
  [4,16,-20,24,10,-16,24,6,-16,24,-6,-20,24,-10],
// 4 16 -20 24 -10 -16 24 -6 16 24 -6 20 24 -10
  [4,16,-20,24,-10,-16,24,-6,16,24,-6,20,24,-10],
// 4 16 20 24 -10 16 24 -6 16 24 6 20 24 10
  [4,16,20,24,-10,16,24,-6,16,24,6,20,24,10],
// 1 16 0 24 0 20 0 0 0 -24 0 0 0 10 box4t.dat
  [1,16,0,24,0,20,0,0,0,-24,0,0,0,10, ldraw_lib__box4t(realsolid)],
// 1 16 10 0 0 1 0 0 0 1 0 0 0 1 stud.dat
  [1,16,10,0,0,1,0,0,0,1,0,0,0,1, ldraw_lib__stud(realsolid)],
// 1 16 -10 0 0 1 0 0 0 1 0 0 0 1 stud.dat
  [1,16,-10,0,0,1,0,0,0,1,0,0,0,1, ldraw_lib__stud(realsolid)],
// 0
];
module ldraw_lib__s__3004s01(step=0, col=false, unit=2/5, alt=false, line=0.2, solid=!$preview)
    makepoly(ldraw_lib__s__3004s01(solid), step=step, col=col, unit=unit, alt=alt, line=line, solid=solid);
ldraw_lib__s__3004s01(line=0.2);
// file: 6041468b.scad
use <../lib.scad>
use <../p/1-4chrd.scad>
use <../p/1-4cyli.scad>
$fa=1; $fs=0.2;
function ldraw_lib__6041468b(realsolid=false) = [
// 0 Sticker  0.9 x  1.9 with Dark Red Arrow
// 0 Name: 6041468b.dat
// 0 Author: Evert-Jan Boer [ejboer]
// 0 !LDRAW_ORG Part UPDATE 2022-04
// 0 !LICENSE Licensed under CC BY 2.0 and CC BY 4.0 : see CAreadme.txt
// 
// 0 BFC CERTIFY CCW
  [0,"BFC","CERTIFY"],
  [0,"BFC","CCW"],
// 
// 0 !KEYWORDS Set 10240, Star Wars, X-Wing
// 
// 0 !HISTORY 2022-07-18 [PTadmin] Official Update 2022-04
// 
// 
// 1 15 16.5 -.25 7.75 1 0 0 0 1 0 0 0 1 1-4chrd.dat
  [1,15,16.5,-.25,7.75,1,0,0,0,1,0,0,0,1, ldraw_lib__1_4chrd(realsolid)],
// 1 15 16.5 -.25 -7.75 0 0 1 0 1 0 -1 0 0 1-4chrd.dat
  [1,15,16.5,-.25,-7.75,0,0,1,0,1,0,-1,0,0, ldraw_lib__1_4chrd(realsolid)],
// 1 15 -16.5 -.25 -7.75 -1 0 0 0 1 0 0 0 -1 1-4chrd.dat
  [1,15,-16.5,-.25,-7.75,-1,0,0,0,1,0,0,0,-1, ldraw_lib__1_4chrd(realsolid)],
// 1 15 -16.5 -.25 7.75 0 0 -1 0 1 0 1 0 0 1-4chrd.dat
  [1,15,-16.5,-.25,7.75,0,0,-1,0,1,0,1,0,0, ldraw_lib__1_4chrd(realsolid)],
// 4 15 -17.5 -.25 7.75 -11 -.25 2.3 -7.7 -.25 2.3 -16.5 -.25 8.75
  [4,15,-17.5,-.25,7.75,-11,-.25,2.3,-7.7,-.25,2.3,-16.5,-.25,8.75],
// 3 15 -16.5 -.25 8.75 -7.7 -.25 2.3 -7.2 -.25 3.9
  [3,15,-16.5,-.25,8.75,-7.7,-.25,2.3,-7.2,-.25,3.9],
// 3 15 -16.5 -.25 8.75 -7.2 -.25 3.9 -6.3 -.25 5.5
  [3,15,-16.5,-.25,8.75,-7.2,-.25,3.9,-6.3,-.25,5.5],
// 3 15 -16.5 -.25 8.75 -6.3 -.25 5.5 -5.2 -.25 6.8
  [3,15,-16.5,-.25,8.75,-6.3,-.25,5.5,-5.2,-.25,6.8],
// 3 15 -16.5 -.25 8.75 -5.2 -.25 6.8 -4.2 -.25 7.3
  [3,15,-16.5,-.25,8.75,-5.2,-.25,6.8,-4.2,-.25,7.3],
// 4 15 -7.7 -.25 -2.3 -11 -.25 -2.3 -17.5 -.25 -7.75 -16.5 -.25 -8.75
  [4,15,-7.7,-.25,-2.3,-11,-.25,-2.3,-17.5,-.25,-7.75,-16.5,-.25,-8.75],
// 4 15 -11 -.25 -2.3 -11 -.25 2.3 -17.5 -.25 7.75 -17.5 -.25 -7.75
  [4,15,-11,-.25,-2.3,-11,-.25,2.3,-17.5,-.25,7.75,-17.5,-.25,-7.75],
// 3 15 -7.7 -.25 -2.3 -16.5 -.25 -8.75 -7.2 -.25 -3.9
  [3,15,-7.7,-.25,-2.3,-16.5,-.25,-8.75,-7.2,-.25,-3.9],
// 3 15 -7.2 -.25 -3.9 -16.5 -.25 -8.75 -6.3 -.25 -5.5
  [3,15,-7.2,-.25,-3.9,-16.5,-.25,-8.75,-6.3,-.25,-5.5],
// 3 15 -6.3 -.25 -5.5 -16.5 -.25 -8.75 -5.2 -.25 -6.8
  [3,15,-6.3,-.25,-5.5,-16.5,-.25,-8.75,-5.2,-.25,-6.8],
// 3 15 -5.2 -.25 -6.8 -16.5 -.25 -8.75 -4.2 -.25 -7.3
  [3,15,-5.2,-.25,-6.8,-16.5,-.25,-8.75,-4.2,-.25,-7.3],
// 3 15 -16.5 -.25 8.75 -4.2 -.25 7.3 -3.5 -.25 7.4
  [3,15,-16.5,-.25,8.75,-4.2,-.25,7.3,-3.5,-.25,7.4],
// 3 15 -4.2 -.25 -7.3 -16.5 -.25 -8.75 -3.5 -.25 -7.4
  [3,15,-4.2,-.25,-7.3,-16.5,-.25,-8.75,-3.5,-.25,-7.4],
// 4 15 -16.5 -.25 8.75 -3.5 -.25 7.4 -2.3 -.25 7.3 16.5 -.25 8.75
  [4,15,-16.5,-.25,8.75,-3.5,-.25,7.4,-2.3,-.25,7.3,16.5,-.25,8.75],
// 3 15 16.5 -.25 8.75 -2.3 -.25 7.3 2 -.25 5.55
  [3,15,16.5,-.25,8.75,-2.3,-.25,7.3,2,-.25,5.55],
// 3 15 16.5 -.25 8.75 2 -.25 5.55 6.3 -.25 3.45
  [3,15,16.5,-.25,8.75,2,-.25,5.55,6.3,-.25,3.45],
// 4 15 6.3 -.25 3.45 10.4 -.25 1.1 17.5 -.25 7.75 16.5 -.25 8.75
  [4,15,6.3,-.25,3.45,10.4,-.25,1.1,17.5,-.25,7.75,16.5,-.25,8.75],
// 3 15 17.5 -.25 7.75 10.4 -.25 1.1 11.5 -.25 .3
  [3,15,17.5,-.25,7.75,10.4,-.25,1.1,11.5,-.25,.3],
// 4 15 -16.5 -.25 -8.75 16.5 -.25 -8.75 -2.3 -.25 -7.3 -3.5 -.25 -7.4
  [4,15,-16.5,-.25,-8.75,16.5,-.25,-8.75,-2.3,-.25,-7.3,-3.5,-.25,-7.4],
// 3 15 2 -.25 -5.55 -2.3 -.25 -7.3 16.5 -.25 -8.75
  [3,15,2,-.25,-5.55,-2.3,-.25,-7.3,16.5,-.25,-8.75],
// 4 15 2 -.25 -5.55 16.5 -.25 -8.75 17.5 -.25 -7.75 6.3 -.25 -3.45
  [4,15,2,-.25,-5.55,16.5,-.25,-8.75,17.5,-.25,-7.75,6.3,-.25,-3.45],
// 3 15 10.4 -.25 -1.1 6.3 -.25 -3.45 17.5 -.25 -7.75
  [3,15,10.4,-.25,-1.1,6.3,-.25,-3.45,17.5,-.25,-7.75],
// 3 15 11.5 -.25 -.3 10.4 -.25 -1.1 17.5 -.25 -7.75
  [3,15,11.5,-.25,-.3,10.4,-.25,-1.1,17.5,-.25,-7.75],
// 3 15 11.7 -.25 0 11.5 -.25 -.3 17.5 -.25 -7.75
  [3,15,11.7,-.25,0,11.5,-.25,-.3,17.5,-.25,-7.75],
// 4 15 11.5 -.25 .3 11.7 -.25 0 17.5 -.25 -7.75 17.5 -.25 7.75
  [4,15,11.5,-.25,.3,11.7,-.25,0,17.5,-.25,-7.75,17.5,-.25,7.75],
// 4 320 -11 -.25 2.3 -11 -.25 -2.3 -7.7 -.25 -2.3 -7.7 -.25 2.3
  [4,320,-11,-.25,2.3,-11,-.25,-2.3,-7.7,-.25,-2.3,-7.7,-.25,2.3],
// 3 320 11.5 -.25 .3 11.5 -.25 -.3 11.7 -.25 0
  [3,320,11.5,-.25,.3,11.5,-.25,-.3,11.7,-.25,0],
// 4 320 10.4 -.25 1.1 10.4 -.25 -1.1 11.5 -.25 -.3 11.5 -.25 .3
  [4,320,10.4,-.25,1.1,10.4,-.25,-1.1,11.5,-.25,-.3,11.5,-.25,.3],
// 4 320 6.3 -.25 3.45 6.3 -.25 -3.45 10.4 -.25 -1.1 10.4 -.25 1.1
  [4,320,6.3,-.25,3.45,6.3,-.25,-3.45,10.4,-.25,-1.1,10.4,-.25,1.1],
// 4 320 2 -.25 5.55 2 -.25 -5.55 6.3 -.25 -3.45 6.3 -.25 3.45
  [4,320,2,-.25,5.55,2,-.25,-5.55,6.3,-.25,-3.45,6.3,-.25,3.45],
// 4 320 -2.3 -.25 7.3 -2.3 -.25 -7.3 2 -.25 -5.55 2 -.25 5.55
  [4,320,-2.3,-.25,7.3,-2.3,-.25,-7.3,2,-.25,-5.55,2,-.25,5.55],
// 4 320 -3.5 -.25 7.4 -3.5 -.25 -7.4 -2.3 -.25 -7.3 -2.3 -.25 7.3
  [4,320,-3.5,-.25,7.4,-3.5,-.25,-7.4,-2.3,-.25,-7.3,-2.3,-.25,7.3],
// 4 320 -4.2 -.25 7.3 -4.2 -.25 -7.3 -3.5 -.25 -7.4 -3.5 -.25 7.4
  [4,320,-4.2,-.25,7.3,-4.2,-.25,-7.3,-3.5,-.25,-7.4,-3.5,-.25,7.4],
// 4 320 -5.2 -.25 6.8 -5.2 -.25 -6.8 -4.2 -.25 -7.3 -4.2 -.25 7.3
  [4,320,-5.2,-.25,6.8,-5.2,-.25,-6.8,-4.2,-.25,-7.3,-4.2,-.25,7.3],
// 4 320 -6.3 -.25 5.5 -6.3 -.25 -5.5 -5.2 -.25 -6.8 -5.2 -.25 6.8
  [4,320,-6.3,-.25,5.5,-6.3,-.25,-5.5,-5.2,-.25,-6.8,-5.2,-.25,6.8],
// 4 320 -7.2 -.25 3.9 -7.2 -.25 -3.9 -6.3 -.25 -5.5 -6.3 -.25 5.5
  [4,320,-7.2,-.25,3.9,-7.2,-.25,-3.9,-6.3,-.25,-5.5,-6.3,-.25,5.5],
// 4 320 -7.7 -.25 2.3 -7.7 -.25 -2.3 -7.2 -.25 -3.9 -7.2 -.25 3.9
  [4,320,-7.7,-.25,2.3,-7.7,-.25,-2.3,-7.2,-.25,-3.9,-7.2,-.25,3.9],
// 
// 1 16 16.5 0 7.75 1 0 0 0 -1 0 0 0 1 1-4chrd.dat
  [1,16,16.5,0,7.75,1,0,0,0,-1,0,0,0,1, ldraw_lib__1_4chrd(realsolid)],
// 1 16 16.5 0 -7.75 0 0 1 0 -1 0 -1 0 0 1-4chrd.dat
  [1,16,16.5,0,-7.75,0,0,1,0,-1,0,-1,0,0, ldraw_lib__1_4chrd(realsolid)],
// 1 16 -16.5 0 -7.75 -1 0 0 0 -1 0 0 0 -1 1-4chrd.dat
  [1,16,-16.5,0,-7.75,-1,0,0,0,-1,0,0,0,-1, ldraw_lib__1_4chrd(realsolid)],
// 1 16 -16.5 0 7.75 0 0 -1 0 -1 0 1 0 0 1-4chrd.dat
  [1,16,-16.5,0,7.75,0,0,-1,0,-1,0,1,0,0, ldraw_lib__1_4chrd(realsolid)],
// 4 16 -16.5 0 -8.75 -17.5 0 -7.75 -17.5 0 7.75 -16.5 0 8.75
  [4,16,-16.5,0,-8.75,-17.5,0,-7.75,-17.5,0,7.75,-16.5,0,8.75],
// 4 16 16.5 0 8.75 16.5 0 -8.75 -16.5 0 -8.75 -16.5 0 8.75
  [4,16,16.5,0,8.75,16.5,0,-8.75,-16.5,0,-8.75,-16.5,0,8.75],
// 4 16 17.5 0 -7.75 16.5 0 -8.75 16.5 0 8.75 17.5 0 7.75
  [4,16,17.5,0,-7.75,16.5,0,-8.75,16.5,0,8.75,17.5,0,7.75],
// 
// 1 16 16.5 -.25 7.75 1 0 0 0 .25 0 0 0 1 1-4cyli.dat
  [1,16,16.5,-.25,7.75,1,0,0,0,.25,0,0,0,1, ldraw_lib__1_4cyli(realsolid)],
// 1 16 16.5 -.25 -7.75 0 0 1 0 .25 0 -1 0 0 1-4cyli.dat
  [1,16,16.5,-.25,-7.75,0,0,1,0,.25,0,-1,0,0, ldraw_lib__1_4cyli(realsolid)],
// 1 16 -16.5 -.25 -7.75 -1 0 0 0 .25 0 0 0 -1 1-4cyli.dat
  [1,16,-16.5,-.25,-7.75,-1,0,0,0,.25,0,0,0,-1, ldraw_lib__1_4cyli(realsolid)],
// 1 16 -16.5 -.25 7.75 0 0 -1 0 .25 0 1 0 0 1-4cyli.dat
  [1,16,-16.5,-.25,7.75,0,0,-1,0,.25,0,1,0,0, ldraw_lib__1_4cyli(realsolid)],
// 4 16 16.5 -.25 -8.75 -16.5 -.25 -8.75 -16.5 0 -8.75 16.5 0 -8.75
  [4,16,16.5,-.25,-8.75,-16.5,-.25,-8.75,-16.5,0,-8.75,16.5,0,-8.75],
// 4 16 17.5 -.25 7.75 17.5 -.25 -7.75 17.5 0 -7.75 17.5 0 7.75
  [4,16,17.5,-.25,7.75,17.5,-.25,-7.75,17.5,0,-7.75,17.5,0,7.75],
// 4 16 -16.5 -.25 8.75 16.5 -.25 8.75 16.5 0 8.75 -16.5 0 8.75
  [4,16,-16.5,-.25,8.75,16.5,-.25,8.75,16.5,0,8.75,-16.5,0,8.75],
// 4 16 -17.5 -.25 -7.75 -17.5 -.25 7.75 -17.5 0 7.75 -17.5 0 -7.75
  [4,16,-17.5,-.25,-7.75,-17.5,-.25,7.75,-17.5,0,7.75,-17.5,0,-7.75],
];
module ldraw_lib__6041468b(step=0, col=false, unit=2/5, alt=false, line=0.2, solid=!$preview)
    makepoly(ldraw_lib__6041468b(solid), step=step, col=col, unit=unit, alt=alt, line=line, solid=solid);
ldraw_lib__6041468b(line=0.2);
// file: 3004.scad
use <../lib.scad>
use <s/3004s01.scad>
function ldraw_lib__3004() = [
// 0 Brick  1 x  2
// 0 Name: 3004.dat
// 0 Author: James Jessiman
// 0 !LDRAW_ORG Part UPDATE 2022-05
// 0 !LICENSE Licensed under CC BY 2.0 and CC BY 4.0 : see CAreadme.txt
// 
// 0 BFC CERTIFY CCW
  [0,"BFC","CERTIFY"],
  [0,"BFC","CCW"],
// 
// 0 !HISTORY 2001-10-26 [PTadmin] Official Update 2001-01
// 0 !HISTORY 2002-05-07 {unknown} BFC Certification
// 0 !HISTORY 2002-06-11 [PTadmin] Official Update 2002-03
// 0 !HISTORY 2007-05-07 [PTadmin] Header formatted for Contributor Agreement
// 0 !HISTORY 2008-07-01 [PTadmin] Official Update 2008-01
// 0 !HISTORY 2022-08-04 [MagFors] Using subfile
// 0 !HISTORY 2022-09-15 [PTadmin] Official Update 2022-05
// 
// 
// 1 16 0 0 0 1 0 0 0 1 0 0 0 1 s\3004s01.dat
  [1,16,0,0,0,1,0,0,0,1,0,0,0,1, ldraw_lib__s__3004s01()],
// 4 16 -20 24 -10 20 24 -10 20 0 -10 -20 0 -10
  [4,16,-20,24,-10,20,24,-10,20,0,-10,-20,0,-10],
];
module ldraw_lib__3004(step=0, col=false, unit=2/5, alt=false, line=0.2, solid=!$preview)
    makepoly(ldraw_lib__3004(), step=step, col=col, unit=unit, alt=alt, line=line, solid=solid);
ldraw_lib__3004(line=0.2);
// main file
use <../lib.scad>
use <3004.scad>
use <6041468b.scad>
function ldraw_lib__3004d04() = [
// 0 Brick  1 x  2 with Dark Red Arrow Pointing Left Sticker
// 0 Name: 3004d04.dat
// 0 Author: Evert-Jan Boer [ejboer]
// 0 !LDRAW_ORG Shortcut UPDATE 2024-04
// 0 !LICENSE Licensed under CC BY 4.0 : see CAreadme.txt
// 
// 0 BFC CERTIFY CCW
  [0,"BFC","CERTIFY"],
  [0,"BFC","CCW"],
// 
// 0 !CATEGORY Sticker Shortcut
// 0 !KEYWORDS Bricklink 3004pb115L, Set 10240, Star Wars, X-Wing
// 
// 0 !HISTORY 2024-05-28 [OrionP] Official Update 2024-04
// 
// 1 16 0 0 0 1 0 0 0 1 0 0 0 1 3004.dat
  [1,16,0,0,0,1,0,0,0,1,0,0,0,1, ldraw_lib__3004()],
// 1 15 0 12 -10 -1 0 0 0 0 1 0 1 0 6041468b.dat
  [1,15,0,12,-10,-1,0,0,0,0,1,0,1,0, ldraw_lib__6041468b()],
];
module ldraw_lib__3004d04(step=0, col=false, unit=2/5, alt=false, line=0.2, solid=!$preview)
    makepoly(ldraw_lib__3004d04(), step=step, col=col, unit=unit, alt=alt, line=line, solid=solid);
ldraw_lib__3004d04(line=0.2);
